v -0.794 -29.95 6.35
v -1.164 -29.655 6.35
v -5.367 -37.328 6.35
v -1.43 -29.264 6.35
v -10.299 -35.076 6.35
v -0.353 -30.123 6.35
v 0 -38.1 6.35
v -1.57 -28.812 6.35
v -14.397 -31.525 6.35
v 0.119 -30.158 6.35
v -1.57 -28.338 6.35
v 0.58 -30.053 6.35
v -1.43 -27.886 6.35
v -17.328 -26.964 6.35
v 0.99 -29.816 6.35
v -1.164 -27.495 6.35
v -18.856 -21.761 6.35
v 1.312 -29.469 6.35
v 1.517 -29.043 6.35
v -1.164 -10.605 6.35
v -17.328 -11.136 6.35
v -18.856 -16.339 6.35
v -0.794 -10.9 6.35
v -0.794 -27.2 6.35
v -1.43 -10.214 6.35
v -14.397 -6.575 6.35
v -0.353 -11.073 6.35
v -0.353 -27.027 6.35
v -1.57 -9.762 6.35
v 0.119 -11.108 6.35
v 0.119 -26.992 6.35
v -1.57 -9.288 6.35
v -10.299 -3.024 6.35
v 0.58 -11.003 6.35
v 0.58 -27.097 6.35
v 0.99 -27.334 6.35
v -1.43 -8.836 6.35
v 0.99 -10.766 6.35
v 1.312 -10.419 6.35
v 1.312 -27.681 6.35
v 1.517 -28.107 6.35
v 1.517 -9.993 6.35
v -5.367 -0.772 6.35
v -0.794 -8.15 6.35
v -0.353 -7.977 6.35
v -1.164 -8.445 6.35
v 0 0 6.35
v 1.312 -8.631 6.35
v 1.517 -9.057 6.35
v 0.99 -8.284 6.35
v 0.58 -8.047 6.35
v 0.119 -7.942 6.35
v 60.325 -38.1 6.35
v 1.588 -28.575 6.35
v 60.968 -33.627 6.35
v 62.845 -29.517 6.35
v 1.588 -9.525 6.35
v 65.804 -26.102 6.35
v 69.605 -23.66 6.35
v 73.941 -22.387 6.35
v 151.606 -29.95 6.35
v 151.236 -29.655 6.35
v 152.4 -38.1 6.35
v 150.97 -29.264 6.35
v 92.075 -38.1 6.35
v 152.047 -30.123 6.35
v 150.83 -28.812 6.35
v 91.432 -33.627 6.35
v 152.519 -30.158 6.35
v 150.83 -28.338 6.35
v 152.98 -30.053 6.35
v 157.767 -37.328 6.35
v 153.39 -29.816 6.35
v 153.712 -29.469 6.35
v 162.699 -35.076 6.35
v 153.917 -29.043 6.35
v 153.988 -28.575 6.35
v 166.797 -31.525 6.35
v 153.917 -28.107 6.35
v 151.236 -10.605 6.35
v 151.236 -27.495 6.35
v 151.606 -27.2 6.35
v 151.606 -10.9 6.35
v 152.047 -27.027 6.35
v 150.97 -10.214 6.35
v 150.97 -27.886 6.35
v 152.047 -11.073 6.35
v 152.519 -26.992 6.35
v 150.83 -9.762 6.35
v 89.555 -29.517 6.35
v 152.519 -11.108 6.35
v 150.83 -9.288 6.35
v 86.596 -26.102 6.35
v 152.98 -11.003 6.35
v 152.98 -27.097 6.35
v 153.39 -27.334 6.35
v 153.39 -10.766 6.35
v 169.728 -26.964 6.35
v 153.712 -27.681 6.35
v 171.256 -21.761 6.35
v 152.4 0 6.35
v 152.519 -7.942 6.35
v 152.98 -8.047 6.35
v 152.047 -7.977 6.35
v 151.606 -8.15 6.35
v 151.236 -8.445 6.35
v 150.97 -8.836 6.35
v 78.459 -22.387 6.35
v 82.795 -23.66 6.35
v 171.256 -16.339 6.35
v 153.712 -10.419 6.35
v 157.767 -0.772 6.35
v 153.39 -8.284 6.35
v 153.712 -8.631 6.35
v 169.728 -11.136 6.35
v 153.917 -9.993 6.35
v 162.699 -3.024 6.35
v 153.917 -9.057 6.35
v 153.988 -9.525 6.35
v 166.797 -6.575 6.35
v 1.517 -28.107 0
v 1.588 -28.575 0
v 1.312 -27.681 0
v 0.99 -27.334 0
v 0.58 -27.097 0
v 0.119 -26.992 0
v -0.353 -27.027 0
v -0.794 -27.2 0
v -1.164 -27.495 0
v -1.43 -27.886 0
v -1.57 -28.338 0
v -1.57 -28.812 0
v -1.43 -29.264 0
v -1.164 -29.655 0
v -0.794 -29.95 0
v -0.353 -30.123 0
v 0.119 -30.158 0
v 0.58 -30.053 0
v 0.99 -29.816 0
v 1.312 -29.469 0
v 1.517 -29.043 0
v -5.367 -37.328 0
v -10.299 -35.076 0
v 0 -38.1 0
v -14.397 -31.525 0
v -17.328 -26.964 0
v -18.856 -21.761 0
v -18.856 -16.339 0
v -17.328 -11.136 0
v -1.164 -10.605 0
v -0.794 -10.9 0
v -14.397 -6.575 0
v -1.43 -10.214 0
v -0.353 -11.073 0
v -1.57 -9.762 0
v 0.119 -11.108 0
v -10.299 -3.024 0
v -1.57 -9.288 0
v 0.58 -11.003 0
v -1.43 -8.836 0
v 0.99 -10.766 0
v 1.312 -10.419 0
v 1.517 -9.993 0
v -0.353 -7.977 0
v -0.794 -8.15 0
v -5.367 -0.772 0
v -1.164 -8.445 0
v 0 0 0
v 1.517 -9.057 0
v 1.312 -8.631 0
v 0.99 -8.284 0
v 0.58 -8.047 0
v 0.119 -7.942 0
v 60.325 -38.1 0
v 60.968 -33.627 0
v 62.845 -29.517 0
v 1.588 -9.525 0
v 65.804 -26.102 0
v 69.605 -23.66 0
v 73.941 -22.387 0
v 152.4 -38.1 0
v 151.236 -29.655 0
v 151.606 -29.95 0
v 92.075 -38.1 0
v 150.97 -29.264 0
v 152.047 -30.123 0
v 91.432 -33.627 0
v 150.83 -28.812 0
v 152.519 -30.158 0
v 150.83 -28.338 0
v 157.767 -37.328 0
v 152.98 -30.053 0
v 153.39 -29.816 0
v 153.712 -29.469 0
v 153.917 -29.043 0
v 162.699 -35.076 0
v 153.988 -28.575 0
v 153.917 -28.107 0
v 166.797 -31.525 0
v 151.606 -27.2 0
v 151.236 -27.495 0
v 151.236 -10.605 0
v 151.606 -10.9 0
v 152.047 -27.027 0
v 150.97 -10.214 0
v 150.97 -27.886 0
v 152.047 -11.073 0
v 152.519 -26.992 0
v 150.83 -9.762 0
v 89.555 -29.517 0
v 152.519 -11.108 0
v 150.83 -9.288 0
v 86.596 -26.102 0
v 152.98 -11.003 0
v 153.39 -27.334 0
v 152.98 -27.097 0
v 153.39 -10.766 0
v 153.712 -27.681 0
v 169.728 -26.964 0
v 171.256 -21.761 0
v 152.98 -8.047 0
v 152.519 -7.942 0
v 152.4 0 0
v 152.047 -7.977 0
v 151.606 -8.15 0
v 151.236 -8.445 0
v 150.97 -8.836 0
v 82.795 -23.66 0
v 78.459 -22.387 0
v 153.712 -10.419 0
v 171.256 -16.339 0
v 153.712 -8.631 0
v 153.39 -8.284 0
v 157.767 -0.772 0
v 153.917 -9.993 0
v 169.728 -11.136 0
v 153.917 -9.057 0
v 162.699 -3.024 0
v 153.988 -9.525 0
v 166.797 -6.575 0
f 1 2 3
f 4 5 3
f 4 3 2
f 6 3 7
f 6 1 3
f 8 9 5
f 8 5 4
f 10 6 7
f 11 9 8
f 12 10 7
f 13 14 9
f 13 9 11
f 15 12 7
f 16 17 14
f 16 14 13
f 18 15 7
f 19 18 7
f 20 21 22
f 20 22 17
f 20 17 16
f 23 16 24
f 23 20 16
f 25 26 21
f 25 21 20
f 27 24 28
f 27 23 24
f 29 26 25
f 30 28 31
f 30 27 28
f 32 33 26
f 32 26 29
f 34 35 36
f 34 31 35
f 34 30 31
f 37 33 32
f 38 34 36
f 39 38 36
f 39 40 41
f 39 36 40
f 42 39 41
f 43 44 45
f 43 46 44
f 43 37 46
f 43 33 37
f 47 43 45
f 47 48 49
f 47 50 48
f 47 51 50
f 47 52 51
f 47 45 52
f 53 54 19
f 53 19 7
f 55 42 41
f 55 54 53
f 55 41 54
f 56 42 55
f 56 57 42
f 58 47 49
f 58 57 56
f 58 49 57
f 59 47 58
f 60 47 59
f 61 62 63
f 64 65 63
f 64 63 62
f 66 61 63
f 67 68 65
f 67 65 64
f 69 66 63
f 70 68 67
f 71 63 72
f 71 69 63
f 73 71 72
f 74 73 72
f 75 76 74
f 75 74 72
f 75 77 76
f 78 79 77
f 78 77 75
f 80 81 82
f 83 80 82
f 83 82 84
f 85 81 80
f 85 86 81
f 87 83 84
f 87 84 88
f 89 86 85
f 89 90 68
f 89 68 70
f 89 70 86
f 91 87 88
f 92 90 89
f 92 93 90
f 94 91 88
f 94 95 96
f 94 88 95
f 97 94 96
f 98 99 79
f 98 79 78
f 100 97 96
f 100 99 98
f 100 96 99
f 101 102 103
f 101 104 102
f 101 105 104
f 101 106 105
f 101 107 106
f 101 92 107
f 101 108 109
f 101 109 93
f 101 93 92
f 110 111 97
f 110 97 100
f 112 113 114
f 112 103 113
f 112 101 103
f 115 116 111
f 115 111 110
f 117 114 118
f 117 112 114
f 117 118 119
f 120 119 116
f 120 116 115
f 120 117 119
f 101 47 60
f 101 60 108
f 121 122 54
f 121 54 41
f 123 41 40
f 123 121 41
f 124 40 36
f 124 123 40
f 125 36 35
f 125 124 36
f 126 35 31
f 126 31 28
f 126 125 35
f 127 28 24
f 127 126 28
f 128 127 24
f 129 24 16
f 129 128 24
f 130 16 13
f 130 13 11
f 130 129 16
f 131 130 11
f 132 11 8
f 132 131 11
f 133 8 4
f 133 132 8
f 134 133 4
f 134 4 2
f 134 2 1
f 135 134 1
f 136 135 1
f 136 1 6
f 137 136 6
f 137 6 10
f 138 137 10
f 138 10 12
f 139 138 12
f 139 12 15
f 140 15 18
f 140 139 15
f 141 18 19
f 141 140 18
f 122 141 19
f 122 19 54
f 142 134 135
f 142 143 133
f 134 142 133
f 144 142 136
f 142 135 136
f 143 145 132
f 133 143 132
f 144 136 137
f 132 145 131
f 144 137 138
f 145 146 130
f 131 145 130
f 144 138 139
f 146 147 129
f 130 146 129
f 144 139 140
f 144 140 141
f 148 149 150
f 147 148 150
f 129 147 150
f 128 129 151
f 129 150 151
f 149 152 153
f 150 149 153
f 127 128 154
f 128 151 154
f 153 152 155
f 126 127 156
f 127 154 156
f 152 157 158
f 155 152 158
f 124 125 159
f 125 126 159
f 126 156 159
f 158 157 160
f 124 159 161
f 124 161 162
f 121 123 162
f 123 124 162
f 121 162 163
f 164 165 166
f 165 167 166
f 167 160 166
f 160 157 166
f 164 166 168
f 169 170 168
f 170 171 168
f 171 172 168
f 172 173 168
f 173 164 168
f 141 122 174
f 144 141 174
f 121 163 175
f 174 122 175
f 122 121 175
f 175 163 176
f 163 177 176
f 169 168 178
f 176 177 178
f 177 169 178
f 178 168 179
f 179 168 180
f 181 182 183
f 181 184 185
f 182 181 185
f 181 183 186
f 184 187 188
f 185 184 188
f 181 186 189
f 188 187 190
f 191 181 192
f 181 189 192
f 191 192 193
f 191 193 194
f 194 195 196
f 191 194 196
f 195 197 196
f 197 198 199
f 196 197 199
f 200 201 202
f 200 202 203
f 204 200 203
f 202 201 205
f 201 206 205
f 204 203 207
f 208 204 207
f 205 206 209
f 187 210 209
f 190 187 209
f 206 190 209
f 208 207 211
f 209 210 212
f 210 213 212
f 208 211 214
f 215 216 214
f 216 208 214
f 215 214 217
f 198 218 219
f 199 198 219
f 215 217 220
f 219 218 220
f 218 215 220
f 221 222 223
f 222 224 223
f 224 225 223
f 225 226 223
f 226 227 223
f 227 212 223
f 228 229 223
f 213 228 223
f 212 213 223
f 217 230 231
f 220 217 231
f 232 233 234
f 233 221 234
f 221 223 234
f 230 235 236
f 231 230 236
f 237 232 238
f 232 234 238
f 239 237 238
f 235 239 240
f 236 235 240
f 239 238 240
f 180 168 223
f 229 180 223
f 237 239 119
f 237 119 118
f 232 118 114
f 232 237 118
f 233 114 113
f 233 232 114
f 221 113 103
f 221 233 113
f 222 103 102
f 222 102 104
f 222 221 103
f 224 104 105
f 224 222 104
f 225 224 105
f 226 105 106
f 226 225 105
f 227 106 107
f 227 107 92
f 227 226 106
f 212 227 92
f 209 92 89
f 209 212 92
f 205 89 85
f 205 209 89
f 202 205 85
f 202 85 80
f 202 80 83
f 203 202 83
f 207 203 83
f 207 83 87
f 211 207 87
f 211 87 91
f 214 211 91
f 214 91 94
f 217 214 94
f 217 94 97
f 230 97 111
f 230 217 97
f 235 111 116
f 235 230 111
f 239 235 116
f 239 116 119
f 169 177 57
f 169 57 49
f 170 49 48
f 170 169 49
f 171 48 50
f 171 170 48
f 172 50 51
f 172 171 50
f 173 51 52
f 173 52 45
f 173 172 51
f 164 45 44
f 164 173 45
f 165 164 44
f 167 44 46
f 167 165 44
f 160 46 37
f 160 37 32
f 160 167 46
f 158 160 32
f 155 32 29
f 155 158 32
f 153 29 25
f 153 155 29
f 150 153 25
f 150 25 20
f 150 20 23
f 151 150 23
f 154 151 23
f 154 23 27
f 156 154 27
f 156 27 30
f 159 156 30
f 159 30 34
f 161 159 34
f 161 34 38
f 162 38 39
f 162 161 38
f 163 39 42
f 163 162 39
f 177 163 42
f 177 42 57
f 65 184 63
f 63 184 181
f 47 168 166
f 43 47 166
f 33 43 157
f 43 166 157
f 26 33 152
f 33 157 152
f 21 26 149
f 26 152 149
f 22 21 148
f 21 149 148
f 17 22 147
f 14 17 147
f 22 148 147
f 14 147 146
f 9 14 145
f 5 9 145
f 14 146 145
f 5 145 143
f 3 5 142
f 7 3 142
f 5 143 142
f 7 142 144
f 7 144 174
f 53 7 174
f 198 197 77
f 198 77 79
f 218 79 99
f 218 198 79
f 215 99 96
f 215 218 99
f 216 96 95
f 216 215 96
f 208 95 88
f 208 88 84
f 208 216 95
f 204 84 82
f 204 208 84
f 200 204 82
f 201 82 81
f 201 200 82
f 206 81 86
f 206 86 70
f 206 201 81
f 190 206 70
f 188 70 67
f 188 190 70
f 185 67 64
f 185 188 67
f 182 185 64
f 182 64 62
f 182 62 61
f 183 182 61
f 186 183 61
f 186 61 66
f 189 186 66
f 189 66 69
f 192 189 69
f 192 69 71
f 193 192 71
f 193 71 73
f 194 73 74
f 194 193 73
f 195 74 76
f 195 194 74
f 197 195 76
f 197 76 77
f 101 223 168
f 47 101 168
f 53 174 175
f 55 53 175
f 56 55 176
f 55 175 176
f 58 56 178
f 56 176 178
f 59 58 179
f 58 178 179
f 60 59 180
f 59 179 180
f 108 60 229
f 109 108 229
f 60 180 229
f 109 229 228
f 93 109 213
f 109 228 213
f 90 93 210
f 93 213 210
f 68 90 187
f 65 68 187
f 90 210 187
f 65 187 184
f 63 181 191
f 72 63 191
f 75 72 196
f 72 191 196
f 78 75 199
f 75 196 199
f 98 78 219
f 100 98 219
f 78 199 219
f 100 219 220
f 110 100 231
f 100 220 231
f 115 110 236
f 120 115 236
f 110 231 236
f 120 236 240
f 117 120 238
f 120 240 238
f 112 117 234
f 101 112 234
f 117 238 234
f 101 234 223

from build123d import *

# Parameters (mm, degrees)
F0_R     = 1.5875
F1_DEPTH = 6.35


with BuildPart() as f1:
    # F0 (on Top) → F1 (new body)
    with BuildSketch(Plane.XY):
        with BuildLine():
            Line((152.4, 0), (0, 0))
            ThreePointArc((0, 0), (-19.05, -19.05), (0, -38.1))
            Line((0, -38.1), (60.325, -38.1))
            ThreePointArc((60.325, -38.1), (76.2, -22.225), (92.075, -38.1))
            Line((92.075, -38.1), (152.4, -38.1))
            ThreePointArc((152.4, -38.1), (171.45, -19.05), (152.4, 0))
        make_face()
        with Locations((0, -28.575)):
            Circle(F0_R, mode=Mode.SUBTRACT)
        with Locations((152.4, -28.575)):
            Circle(F0_R, mode=Mode.SUBTRACT)
        with Locations((0, -9.525)):
            Circle(F0_R, mode=Mode.SUBTRACT)
        with Locations((152.4, -9.525)):
            Circle(F0_R, mode=Mode.SUBTRACT)
    extrude(amount=F1_DEPTH)


solid = f1.part
